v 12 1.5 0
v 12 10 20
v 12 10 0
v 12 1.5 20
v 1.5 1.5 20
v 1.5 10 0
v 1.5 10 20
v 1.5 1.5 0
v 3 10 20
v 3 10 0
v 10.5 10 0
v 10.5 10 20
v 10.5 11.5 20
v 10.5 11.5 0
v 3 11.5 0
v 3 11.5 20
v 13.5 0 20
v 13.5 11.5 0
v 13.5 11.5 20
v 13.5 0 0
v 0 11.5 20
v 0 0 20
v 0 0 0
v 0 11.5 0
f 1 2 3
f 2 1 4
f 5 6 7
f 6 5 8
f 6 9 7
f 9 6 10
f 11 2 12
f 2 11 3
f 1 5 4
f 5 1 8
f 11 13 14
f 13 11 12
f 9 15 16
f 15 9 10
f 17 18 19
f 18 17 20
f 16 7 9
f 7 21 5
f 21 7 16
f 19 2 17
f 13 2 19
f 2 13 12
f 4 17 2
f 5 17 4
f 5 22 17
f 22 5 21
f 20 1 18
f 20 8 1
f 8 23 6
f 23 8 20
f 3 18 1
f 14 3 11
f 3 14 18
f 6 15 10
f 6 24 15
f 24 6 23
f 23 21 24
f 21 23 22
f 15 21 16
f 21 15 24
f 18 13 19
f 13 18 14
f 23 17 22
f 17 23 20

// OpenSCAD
//
//  hubholder.scad
//  SensorClock.enclosure.misc
//
//  created by yu2924 on 2026-10-11
//

ThWall = 1.5;
HubWidth = 10.5;
HubHeight = 8.5;
OuterWidth = HubWidth + ThWall * 2;
OuterHeight = HubHeight + ThWall * 2;
CutoutWidth = HubWidth - 3;
BaseDepth = 20;

difference()
{
    cube([OuterWidth, OuterHeight, BaseDepth], center=false);
    union()
    {
        translate([ThWall, ThWall, -1])
            cube([HubWidth, HubHeight, BaseDepth + 2], center=false);
        translate([(OuterWidth - CutoutWidth) / 2, OuterHeight - ThWall - 1, -1])
            cube([CutoutWidth, ThWall + 2, BaseDepth + 2], center=false);
    }
}
